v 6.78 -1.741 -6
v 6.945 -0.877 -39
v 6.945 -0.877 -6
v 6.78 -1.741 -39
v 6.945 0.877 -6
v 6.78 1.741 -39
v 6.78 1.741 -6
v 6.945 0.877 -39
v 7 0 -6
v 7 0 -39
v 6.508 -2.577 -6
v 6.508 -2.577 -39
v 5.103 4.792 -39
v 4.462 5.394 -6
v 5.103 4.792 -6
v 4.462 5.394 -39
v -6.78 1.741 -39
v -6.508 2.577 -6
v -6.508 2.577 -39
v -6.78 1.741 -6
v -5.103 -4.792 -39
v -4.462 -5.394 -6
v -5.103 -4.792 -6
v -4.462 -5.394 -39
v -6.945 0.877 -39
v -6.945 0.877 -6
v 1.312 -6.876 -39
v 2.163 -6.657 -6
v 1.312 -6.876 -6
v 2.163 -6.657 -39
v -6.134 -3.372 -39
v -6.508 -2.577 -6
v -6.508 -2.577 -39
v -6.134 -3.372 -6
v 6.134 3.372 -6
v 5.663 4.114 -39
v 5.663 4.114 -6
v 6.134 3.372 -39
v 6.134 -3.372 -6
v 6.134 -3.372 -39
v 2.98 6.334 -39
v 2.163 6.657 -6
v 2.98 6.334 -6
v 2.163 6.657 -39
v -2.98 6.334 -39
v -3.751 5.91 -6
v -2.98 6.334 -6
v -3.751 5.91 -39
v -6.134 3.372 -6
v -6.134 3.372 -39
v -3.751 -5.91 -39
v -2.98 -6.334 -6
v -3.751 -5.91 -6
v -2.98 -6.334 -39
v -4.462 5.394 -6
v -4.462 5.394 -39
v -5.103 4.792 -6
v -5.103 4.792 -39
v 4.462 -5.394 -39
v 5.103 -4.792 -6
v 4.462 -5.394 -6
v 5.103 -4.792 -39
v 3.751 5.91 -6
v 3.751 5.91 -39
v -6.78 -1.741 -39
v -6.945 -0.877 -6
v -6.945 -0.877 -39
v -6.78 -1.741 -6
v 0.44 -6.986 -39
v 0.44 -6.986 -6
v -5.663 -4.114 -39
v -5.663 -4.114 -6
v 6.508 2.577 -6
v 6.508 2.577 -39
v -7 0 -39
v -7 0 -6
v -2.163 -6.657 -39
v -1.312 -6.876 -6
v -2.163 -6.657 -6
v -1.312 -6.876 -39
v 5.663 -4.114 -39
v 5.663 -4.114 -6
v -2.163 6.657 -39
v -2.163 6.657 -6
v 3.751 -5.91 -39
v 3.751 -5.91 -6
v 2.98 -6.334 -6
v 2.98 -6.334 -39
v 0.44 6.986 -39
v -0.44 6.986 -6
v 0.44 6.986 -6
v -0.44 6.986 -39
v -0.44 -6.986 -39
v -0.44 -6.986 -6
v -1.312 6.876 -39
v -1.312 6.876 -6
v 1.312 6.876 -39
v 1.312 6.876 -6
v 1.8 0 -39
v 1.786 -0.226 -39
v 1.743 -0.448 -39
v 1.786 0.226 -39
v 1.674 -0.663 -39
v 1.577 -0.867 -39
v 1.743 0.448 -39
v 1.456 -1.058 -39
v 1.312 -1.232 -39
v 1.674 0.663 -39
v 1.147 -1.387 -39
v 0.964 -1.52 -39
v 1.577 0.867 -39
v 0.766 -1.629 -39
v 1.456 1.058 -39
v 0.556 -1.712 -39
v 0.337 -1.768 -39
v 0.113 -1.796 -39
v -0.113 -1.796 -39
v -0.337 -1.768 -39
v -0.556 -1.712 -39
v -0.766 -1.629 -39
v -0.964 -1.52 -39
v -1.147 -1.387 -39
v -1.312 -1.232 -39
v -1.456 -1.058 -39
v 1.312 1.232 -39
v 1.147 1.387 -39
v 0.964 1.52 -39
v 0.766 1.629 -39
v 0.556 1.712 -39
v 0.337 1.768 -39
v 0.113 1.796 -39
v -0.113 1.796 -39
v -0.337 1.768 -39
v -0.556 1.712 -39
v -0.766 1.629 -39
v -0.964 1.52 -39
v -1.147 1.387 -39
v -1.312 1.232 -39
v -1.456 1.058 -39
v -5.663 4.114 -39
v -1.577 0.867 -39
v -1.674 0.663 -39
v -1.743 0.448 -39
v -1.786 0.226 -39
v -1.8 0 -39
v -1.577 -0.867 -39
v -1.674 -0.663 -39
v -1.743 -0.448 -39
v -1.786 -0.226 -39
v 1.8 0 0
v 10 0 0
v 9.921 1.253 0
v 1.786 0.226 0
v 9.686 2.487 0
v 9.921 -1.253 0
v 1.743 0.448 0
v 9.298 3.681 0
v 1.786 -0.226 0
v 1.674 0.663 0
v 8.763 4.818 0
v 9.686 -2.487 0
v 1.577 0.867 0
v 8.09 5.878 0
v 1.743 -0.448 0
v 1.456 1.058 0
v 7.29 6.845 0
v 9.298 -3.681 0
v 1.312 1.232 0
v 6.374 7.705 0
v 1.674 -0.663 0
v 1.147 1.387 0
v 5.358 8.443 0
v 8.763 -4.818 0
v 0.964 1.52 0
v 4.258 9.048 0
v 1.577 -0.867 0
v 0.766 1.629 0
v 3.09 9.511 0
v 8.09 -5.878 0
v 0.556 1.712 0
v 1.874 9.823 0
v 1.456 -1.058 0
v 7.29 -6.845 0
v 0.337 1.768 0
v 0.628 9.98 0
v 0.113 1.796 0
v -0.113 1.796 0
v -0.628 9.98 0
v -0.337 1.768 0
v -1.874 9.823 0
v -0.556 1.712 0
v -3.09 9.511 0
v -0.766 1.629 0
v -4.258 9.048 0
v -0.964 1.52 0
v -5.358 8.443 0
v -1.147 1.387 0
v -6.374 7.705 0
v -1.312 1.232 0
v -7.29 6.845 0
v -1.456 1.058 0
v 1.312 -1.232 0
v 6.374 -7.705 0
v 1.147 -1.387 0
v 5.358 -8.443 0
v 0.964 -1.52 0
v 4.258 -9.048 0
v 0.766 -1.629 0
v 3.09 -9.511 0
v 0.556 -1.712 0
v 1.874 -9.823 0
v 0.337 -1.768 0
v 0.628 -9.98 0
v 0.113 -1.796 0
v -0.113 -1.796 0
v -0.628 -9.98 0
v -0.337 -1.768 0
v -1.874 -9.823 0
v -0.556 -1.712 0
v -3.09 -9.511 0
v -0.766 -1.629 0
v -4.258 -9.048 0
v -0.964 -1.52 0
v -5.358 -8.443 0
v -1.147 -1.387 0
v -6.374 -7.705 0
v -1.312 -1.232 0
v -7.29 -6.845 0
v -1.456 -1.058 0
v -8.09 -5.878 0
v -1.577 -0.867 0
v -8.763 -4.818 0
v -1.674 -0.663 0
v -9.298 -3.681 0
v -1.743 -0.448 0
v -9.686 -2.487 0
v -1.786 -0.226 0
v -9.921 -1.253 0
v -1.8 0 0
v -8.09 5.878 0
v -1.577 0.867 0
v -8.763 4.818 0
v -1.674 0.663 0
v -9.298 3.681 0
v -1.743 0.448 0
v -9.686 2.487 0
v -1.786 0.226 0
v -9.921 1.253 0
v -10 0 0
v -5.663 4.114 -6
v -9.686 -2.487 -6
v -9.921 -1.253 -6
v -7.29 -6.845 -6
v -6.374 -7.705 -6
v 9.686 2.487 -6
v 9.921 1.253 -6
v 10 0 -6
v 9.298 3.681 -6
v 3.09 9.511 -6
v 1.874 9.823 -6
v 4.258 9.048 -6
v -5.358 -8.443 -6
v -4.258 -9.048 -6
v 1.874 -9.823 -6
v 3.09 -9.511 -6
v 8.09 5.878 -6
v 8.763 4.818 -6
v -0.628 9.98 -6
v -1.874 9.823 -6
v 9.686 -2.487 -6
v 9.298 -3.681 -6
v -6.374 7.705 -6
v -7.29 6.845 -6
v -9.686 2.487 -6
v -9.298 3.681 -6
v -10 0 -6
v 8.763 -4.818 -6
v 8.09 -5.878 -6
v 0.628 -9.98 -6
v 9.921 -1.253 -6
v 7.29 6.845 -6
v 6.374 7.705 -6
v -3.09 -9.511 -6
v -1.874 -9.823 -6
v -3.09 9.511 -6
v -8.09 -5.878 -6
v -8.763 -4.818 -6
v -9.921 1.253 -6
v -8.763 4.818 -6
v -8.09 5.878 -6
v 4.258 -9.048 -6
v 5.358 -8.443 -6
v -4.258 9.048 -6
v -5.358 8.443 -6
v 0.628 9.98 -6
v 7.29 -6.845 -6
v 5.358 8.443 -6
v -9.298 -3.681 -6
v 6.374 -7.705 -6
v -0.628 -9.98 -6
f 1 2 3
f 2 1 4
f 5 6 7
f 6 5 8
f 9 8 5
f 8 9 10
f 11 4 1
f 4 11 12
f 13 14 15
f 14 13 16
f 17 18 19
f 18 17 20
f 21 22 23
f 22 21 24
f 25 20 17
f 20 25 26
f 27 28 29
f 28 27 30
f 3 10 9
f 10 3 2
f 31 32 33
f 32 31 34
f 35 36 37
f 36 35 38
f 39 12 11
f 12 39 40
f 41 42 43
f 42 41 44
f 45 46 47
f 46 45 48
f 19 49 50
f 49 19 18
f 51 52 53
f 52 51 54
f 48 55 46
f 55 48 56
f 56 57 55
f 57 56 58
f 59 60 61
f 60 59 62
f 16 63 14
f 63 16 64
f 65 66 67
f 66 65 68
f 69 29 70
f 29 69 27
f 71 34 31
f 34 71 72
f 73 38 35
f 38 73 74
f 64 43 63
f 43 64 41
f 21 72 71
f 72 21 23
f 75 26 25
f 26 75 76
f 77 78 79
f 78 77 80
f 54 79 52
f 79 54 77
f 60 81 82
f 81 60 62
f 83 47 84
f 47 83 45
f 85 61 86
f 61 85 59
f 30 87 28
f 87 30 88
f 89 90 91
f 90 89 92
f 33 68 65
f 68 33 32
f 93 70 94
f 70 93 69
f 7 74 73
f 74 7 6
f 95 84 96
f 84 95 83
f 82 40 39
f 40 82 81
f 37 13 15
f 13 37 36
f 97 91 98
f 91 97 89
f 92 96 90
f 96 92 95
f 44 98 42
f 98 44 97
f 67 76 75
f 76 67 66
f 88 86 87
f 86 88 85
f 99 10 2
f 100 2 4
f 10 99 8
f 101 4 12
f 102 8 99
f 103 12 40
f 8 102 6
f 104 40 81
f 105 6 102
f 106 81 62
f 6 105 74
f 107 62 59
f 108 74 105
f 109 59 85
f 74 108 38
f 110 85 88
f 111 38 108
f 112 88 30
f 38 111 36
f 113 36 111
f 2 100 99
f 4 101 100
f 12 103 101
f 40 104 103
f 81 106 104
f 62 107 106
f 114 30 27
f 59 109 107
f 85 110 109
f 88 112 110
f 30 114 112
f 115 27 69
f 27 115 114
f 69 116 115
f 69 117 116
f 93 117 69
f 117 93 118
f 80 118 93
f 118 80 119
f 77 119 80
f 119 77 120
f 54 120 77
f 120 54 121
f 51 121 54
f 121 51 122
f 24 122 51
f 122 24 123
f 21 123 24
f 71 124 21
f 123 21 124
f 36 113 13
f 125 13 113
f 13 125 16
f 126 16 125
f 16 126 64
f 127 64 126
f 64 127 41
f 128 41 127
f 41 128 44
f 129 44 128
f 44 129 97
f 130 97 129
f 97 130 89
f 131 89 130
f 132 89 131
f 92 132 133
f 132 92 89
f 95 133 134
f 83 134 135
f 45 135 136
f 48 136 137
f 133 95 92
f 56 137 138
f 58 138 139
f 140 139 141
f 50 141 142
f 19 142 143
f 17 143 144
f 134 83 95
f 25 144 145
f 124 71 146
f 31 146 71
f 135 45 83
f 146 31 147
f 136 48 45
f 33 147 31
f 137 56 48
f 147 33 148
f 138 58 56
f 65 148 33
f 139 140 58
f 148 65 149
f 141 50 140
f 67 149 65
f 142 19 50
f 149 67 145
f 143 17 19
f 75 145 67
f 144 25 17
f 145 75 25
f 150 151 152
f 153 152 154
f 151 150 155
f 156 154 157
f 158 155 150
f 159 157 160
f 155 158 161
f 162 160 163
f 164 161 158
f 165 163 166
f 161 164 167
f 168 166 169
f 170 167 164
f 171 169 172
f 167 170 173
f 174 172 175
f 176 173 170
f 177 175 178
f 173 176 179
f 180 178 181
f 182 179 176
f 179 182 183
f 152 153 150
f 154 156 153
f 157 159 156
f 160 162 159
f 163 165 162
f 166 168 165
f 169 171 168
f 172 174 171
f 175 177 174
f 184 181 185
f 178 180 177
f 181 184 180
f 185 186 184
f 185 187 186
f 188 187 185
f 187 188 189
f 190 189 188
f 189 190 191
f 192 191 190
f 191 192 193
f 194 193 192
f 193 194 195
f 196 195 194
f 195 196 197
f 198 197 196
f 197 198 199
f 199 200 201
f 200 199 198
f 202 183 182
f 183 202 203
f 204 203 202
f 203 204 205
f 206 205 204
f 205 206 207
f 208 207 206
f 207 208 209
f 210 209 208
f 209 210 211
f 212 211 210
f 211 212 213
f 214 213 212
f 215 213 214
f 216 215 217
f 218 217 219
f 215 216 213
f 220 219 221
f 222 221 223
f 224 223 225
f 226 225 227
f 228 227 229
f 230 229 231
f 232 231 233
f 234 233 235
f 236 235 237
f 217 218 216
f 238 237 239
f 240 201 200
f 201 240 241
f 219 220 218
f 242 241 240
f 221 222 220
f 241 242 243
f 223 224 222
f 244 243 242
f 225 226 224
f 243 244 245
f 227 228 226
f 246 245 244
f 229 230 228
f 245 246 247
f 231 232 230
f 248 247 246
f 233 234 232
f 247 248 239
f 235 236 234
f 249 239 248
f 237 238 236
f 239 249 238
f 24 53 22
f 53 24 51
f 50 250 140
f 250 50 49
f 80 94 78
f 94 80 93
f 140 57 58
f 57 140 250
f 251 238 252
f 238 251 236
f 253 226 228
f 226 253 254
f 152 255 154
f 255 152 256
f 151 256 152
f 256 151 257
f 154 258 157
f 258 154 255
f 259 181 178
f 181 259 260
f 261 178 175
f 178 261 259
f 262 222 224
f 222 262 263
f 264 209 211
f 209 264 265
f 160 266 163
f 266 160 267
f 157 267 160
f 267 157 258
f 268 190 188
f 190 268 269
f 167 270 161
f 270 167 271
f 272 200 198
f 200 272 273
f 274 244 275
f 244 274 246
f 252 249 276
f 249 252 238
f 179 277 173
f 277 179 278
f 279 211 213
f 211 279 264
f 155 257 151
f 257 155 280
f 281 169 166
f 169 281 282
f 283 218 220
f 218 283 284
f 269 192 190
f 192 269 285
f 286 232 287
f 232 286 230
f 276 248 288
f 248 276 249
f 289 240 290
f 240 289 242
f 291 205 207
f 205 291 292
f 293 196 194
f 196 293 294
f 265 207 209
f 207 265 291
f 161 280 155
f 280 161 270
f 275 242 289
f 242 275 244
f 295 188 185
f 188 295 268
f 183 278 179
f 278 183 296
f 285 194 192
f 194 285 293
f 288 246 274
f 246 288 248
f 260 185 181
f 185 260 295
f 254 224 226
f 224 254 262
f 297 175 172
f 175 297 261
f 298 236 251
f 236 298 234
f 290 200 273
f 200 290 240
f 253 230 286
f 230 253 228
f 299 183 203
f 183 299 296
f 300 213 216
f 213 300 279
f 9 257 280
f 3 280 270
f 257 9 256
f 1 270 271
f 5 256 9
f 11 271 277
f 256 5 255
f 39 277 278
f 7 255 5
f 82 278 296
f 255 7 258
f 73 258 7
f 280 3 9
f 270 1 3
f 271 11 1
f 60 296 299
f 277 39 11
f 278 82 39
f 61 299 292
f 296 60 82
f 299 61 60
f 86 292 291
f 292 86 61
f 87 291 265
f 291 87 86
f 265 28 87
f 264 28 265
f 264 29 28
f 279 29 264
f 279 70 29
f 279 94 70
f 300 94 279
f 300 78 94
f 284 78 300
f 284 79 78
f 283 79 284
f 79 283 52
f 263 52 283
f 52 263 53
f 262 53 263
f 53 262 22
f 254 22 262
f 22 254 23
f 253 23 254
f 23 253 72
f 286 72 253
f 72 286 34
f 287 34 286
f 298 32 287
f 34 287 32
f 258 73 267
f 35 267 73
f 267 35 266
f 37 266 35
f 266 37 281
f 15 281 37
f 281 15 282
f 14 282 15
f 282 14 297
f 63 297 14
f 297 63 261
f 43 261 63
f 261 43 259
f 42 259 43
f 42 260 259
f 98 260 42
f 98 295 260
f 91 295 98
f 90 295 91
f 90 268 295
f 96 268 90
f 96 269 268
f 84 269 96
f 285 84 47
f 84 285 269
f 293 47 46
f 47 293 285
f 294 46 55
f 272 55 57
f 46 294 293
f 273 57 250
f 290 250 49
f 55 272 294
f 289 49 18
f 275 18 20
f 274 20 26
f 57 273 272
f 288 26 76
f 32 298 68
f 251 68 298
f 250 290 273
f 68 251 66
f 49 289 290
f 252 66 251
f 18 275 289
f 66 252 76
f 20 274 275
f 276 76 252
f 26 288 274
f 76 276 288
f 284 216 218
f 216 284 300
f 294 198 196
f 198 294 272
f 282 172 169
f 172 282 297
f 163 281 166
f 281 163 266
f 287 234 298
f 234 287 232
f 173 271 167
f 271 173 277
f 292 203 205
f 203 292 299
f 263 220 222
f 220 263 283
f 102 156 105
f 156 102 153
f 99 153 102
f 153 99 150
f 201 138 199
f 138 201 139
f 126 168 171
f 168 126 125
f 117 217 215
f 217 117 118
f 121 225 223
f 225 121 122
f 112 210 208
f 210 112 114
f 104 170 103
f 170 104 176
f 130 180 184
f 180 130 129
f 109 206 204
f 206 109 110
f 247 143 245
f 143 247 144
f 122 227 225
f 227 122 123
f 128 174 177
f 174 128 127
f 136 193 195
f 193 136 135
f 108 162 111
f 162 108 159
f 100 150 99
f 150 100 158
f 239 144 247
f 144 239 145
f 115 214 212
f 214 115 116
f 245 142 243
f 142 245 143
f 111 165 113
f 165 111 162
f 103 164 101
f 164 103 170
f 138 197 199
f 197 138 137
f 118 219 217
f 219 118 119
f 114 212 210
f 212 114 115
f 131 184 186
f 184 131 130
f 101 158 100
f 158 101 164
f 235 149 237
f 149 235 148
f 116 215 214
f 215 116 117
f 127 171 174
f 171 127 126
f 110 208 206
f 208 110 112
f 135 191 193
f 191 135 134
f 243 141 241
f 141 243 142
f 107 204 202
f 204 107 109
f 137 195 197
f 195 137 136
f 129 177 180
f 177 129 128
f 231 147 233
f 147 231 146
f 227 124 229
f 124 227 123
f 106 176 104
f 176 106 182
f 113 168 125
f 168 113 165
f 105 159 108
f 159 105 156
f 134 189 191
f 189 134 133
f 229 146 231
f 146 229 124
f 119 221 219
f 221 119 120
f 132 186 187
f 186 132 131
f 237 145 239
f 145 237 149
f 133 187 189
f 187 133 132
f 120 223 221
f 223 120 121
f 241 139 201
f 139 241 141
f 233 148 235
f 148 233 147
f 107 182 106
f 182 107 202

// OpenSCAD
$fn = 50;


difference() {
	union() {
		translate(v = [0, 0, -39.0000000000]) {
			cylinder(h = 39, r = 7.0000000000);
		}
		translate(v = [0, 0, -6.0000000000]) {
			cylinder(h = 6, r = 10.0000000000);
		}
	}
	union() {
		#translate(v = [0, 0, -39]) {
			cylinder(h = 39, r = 1.8000000000);
		}
	}
}
